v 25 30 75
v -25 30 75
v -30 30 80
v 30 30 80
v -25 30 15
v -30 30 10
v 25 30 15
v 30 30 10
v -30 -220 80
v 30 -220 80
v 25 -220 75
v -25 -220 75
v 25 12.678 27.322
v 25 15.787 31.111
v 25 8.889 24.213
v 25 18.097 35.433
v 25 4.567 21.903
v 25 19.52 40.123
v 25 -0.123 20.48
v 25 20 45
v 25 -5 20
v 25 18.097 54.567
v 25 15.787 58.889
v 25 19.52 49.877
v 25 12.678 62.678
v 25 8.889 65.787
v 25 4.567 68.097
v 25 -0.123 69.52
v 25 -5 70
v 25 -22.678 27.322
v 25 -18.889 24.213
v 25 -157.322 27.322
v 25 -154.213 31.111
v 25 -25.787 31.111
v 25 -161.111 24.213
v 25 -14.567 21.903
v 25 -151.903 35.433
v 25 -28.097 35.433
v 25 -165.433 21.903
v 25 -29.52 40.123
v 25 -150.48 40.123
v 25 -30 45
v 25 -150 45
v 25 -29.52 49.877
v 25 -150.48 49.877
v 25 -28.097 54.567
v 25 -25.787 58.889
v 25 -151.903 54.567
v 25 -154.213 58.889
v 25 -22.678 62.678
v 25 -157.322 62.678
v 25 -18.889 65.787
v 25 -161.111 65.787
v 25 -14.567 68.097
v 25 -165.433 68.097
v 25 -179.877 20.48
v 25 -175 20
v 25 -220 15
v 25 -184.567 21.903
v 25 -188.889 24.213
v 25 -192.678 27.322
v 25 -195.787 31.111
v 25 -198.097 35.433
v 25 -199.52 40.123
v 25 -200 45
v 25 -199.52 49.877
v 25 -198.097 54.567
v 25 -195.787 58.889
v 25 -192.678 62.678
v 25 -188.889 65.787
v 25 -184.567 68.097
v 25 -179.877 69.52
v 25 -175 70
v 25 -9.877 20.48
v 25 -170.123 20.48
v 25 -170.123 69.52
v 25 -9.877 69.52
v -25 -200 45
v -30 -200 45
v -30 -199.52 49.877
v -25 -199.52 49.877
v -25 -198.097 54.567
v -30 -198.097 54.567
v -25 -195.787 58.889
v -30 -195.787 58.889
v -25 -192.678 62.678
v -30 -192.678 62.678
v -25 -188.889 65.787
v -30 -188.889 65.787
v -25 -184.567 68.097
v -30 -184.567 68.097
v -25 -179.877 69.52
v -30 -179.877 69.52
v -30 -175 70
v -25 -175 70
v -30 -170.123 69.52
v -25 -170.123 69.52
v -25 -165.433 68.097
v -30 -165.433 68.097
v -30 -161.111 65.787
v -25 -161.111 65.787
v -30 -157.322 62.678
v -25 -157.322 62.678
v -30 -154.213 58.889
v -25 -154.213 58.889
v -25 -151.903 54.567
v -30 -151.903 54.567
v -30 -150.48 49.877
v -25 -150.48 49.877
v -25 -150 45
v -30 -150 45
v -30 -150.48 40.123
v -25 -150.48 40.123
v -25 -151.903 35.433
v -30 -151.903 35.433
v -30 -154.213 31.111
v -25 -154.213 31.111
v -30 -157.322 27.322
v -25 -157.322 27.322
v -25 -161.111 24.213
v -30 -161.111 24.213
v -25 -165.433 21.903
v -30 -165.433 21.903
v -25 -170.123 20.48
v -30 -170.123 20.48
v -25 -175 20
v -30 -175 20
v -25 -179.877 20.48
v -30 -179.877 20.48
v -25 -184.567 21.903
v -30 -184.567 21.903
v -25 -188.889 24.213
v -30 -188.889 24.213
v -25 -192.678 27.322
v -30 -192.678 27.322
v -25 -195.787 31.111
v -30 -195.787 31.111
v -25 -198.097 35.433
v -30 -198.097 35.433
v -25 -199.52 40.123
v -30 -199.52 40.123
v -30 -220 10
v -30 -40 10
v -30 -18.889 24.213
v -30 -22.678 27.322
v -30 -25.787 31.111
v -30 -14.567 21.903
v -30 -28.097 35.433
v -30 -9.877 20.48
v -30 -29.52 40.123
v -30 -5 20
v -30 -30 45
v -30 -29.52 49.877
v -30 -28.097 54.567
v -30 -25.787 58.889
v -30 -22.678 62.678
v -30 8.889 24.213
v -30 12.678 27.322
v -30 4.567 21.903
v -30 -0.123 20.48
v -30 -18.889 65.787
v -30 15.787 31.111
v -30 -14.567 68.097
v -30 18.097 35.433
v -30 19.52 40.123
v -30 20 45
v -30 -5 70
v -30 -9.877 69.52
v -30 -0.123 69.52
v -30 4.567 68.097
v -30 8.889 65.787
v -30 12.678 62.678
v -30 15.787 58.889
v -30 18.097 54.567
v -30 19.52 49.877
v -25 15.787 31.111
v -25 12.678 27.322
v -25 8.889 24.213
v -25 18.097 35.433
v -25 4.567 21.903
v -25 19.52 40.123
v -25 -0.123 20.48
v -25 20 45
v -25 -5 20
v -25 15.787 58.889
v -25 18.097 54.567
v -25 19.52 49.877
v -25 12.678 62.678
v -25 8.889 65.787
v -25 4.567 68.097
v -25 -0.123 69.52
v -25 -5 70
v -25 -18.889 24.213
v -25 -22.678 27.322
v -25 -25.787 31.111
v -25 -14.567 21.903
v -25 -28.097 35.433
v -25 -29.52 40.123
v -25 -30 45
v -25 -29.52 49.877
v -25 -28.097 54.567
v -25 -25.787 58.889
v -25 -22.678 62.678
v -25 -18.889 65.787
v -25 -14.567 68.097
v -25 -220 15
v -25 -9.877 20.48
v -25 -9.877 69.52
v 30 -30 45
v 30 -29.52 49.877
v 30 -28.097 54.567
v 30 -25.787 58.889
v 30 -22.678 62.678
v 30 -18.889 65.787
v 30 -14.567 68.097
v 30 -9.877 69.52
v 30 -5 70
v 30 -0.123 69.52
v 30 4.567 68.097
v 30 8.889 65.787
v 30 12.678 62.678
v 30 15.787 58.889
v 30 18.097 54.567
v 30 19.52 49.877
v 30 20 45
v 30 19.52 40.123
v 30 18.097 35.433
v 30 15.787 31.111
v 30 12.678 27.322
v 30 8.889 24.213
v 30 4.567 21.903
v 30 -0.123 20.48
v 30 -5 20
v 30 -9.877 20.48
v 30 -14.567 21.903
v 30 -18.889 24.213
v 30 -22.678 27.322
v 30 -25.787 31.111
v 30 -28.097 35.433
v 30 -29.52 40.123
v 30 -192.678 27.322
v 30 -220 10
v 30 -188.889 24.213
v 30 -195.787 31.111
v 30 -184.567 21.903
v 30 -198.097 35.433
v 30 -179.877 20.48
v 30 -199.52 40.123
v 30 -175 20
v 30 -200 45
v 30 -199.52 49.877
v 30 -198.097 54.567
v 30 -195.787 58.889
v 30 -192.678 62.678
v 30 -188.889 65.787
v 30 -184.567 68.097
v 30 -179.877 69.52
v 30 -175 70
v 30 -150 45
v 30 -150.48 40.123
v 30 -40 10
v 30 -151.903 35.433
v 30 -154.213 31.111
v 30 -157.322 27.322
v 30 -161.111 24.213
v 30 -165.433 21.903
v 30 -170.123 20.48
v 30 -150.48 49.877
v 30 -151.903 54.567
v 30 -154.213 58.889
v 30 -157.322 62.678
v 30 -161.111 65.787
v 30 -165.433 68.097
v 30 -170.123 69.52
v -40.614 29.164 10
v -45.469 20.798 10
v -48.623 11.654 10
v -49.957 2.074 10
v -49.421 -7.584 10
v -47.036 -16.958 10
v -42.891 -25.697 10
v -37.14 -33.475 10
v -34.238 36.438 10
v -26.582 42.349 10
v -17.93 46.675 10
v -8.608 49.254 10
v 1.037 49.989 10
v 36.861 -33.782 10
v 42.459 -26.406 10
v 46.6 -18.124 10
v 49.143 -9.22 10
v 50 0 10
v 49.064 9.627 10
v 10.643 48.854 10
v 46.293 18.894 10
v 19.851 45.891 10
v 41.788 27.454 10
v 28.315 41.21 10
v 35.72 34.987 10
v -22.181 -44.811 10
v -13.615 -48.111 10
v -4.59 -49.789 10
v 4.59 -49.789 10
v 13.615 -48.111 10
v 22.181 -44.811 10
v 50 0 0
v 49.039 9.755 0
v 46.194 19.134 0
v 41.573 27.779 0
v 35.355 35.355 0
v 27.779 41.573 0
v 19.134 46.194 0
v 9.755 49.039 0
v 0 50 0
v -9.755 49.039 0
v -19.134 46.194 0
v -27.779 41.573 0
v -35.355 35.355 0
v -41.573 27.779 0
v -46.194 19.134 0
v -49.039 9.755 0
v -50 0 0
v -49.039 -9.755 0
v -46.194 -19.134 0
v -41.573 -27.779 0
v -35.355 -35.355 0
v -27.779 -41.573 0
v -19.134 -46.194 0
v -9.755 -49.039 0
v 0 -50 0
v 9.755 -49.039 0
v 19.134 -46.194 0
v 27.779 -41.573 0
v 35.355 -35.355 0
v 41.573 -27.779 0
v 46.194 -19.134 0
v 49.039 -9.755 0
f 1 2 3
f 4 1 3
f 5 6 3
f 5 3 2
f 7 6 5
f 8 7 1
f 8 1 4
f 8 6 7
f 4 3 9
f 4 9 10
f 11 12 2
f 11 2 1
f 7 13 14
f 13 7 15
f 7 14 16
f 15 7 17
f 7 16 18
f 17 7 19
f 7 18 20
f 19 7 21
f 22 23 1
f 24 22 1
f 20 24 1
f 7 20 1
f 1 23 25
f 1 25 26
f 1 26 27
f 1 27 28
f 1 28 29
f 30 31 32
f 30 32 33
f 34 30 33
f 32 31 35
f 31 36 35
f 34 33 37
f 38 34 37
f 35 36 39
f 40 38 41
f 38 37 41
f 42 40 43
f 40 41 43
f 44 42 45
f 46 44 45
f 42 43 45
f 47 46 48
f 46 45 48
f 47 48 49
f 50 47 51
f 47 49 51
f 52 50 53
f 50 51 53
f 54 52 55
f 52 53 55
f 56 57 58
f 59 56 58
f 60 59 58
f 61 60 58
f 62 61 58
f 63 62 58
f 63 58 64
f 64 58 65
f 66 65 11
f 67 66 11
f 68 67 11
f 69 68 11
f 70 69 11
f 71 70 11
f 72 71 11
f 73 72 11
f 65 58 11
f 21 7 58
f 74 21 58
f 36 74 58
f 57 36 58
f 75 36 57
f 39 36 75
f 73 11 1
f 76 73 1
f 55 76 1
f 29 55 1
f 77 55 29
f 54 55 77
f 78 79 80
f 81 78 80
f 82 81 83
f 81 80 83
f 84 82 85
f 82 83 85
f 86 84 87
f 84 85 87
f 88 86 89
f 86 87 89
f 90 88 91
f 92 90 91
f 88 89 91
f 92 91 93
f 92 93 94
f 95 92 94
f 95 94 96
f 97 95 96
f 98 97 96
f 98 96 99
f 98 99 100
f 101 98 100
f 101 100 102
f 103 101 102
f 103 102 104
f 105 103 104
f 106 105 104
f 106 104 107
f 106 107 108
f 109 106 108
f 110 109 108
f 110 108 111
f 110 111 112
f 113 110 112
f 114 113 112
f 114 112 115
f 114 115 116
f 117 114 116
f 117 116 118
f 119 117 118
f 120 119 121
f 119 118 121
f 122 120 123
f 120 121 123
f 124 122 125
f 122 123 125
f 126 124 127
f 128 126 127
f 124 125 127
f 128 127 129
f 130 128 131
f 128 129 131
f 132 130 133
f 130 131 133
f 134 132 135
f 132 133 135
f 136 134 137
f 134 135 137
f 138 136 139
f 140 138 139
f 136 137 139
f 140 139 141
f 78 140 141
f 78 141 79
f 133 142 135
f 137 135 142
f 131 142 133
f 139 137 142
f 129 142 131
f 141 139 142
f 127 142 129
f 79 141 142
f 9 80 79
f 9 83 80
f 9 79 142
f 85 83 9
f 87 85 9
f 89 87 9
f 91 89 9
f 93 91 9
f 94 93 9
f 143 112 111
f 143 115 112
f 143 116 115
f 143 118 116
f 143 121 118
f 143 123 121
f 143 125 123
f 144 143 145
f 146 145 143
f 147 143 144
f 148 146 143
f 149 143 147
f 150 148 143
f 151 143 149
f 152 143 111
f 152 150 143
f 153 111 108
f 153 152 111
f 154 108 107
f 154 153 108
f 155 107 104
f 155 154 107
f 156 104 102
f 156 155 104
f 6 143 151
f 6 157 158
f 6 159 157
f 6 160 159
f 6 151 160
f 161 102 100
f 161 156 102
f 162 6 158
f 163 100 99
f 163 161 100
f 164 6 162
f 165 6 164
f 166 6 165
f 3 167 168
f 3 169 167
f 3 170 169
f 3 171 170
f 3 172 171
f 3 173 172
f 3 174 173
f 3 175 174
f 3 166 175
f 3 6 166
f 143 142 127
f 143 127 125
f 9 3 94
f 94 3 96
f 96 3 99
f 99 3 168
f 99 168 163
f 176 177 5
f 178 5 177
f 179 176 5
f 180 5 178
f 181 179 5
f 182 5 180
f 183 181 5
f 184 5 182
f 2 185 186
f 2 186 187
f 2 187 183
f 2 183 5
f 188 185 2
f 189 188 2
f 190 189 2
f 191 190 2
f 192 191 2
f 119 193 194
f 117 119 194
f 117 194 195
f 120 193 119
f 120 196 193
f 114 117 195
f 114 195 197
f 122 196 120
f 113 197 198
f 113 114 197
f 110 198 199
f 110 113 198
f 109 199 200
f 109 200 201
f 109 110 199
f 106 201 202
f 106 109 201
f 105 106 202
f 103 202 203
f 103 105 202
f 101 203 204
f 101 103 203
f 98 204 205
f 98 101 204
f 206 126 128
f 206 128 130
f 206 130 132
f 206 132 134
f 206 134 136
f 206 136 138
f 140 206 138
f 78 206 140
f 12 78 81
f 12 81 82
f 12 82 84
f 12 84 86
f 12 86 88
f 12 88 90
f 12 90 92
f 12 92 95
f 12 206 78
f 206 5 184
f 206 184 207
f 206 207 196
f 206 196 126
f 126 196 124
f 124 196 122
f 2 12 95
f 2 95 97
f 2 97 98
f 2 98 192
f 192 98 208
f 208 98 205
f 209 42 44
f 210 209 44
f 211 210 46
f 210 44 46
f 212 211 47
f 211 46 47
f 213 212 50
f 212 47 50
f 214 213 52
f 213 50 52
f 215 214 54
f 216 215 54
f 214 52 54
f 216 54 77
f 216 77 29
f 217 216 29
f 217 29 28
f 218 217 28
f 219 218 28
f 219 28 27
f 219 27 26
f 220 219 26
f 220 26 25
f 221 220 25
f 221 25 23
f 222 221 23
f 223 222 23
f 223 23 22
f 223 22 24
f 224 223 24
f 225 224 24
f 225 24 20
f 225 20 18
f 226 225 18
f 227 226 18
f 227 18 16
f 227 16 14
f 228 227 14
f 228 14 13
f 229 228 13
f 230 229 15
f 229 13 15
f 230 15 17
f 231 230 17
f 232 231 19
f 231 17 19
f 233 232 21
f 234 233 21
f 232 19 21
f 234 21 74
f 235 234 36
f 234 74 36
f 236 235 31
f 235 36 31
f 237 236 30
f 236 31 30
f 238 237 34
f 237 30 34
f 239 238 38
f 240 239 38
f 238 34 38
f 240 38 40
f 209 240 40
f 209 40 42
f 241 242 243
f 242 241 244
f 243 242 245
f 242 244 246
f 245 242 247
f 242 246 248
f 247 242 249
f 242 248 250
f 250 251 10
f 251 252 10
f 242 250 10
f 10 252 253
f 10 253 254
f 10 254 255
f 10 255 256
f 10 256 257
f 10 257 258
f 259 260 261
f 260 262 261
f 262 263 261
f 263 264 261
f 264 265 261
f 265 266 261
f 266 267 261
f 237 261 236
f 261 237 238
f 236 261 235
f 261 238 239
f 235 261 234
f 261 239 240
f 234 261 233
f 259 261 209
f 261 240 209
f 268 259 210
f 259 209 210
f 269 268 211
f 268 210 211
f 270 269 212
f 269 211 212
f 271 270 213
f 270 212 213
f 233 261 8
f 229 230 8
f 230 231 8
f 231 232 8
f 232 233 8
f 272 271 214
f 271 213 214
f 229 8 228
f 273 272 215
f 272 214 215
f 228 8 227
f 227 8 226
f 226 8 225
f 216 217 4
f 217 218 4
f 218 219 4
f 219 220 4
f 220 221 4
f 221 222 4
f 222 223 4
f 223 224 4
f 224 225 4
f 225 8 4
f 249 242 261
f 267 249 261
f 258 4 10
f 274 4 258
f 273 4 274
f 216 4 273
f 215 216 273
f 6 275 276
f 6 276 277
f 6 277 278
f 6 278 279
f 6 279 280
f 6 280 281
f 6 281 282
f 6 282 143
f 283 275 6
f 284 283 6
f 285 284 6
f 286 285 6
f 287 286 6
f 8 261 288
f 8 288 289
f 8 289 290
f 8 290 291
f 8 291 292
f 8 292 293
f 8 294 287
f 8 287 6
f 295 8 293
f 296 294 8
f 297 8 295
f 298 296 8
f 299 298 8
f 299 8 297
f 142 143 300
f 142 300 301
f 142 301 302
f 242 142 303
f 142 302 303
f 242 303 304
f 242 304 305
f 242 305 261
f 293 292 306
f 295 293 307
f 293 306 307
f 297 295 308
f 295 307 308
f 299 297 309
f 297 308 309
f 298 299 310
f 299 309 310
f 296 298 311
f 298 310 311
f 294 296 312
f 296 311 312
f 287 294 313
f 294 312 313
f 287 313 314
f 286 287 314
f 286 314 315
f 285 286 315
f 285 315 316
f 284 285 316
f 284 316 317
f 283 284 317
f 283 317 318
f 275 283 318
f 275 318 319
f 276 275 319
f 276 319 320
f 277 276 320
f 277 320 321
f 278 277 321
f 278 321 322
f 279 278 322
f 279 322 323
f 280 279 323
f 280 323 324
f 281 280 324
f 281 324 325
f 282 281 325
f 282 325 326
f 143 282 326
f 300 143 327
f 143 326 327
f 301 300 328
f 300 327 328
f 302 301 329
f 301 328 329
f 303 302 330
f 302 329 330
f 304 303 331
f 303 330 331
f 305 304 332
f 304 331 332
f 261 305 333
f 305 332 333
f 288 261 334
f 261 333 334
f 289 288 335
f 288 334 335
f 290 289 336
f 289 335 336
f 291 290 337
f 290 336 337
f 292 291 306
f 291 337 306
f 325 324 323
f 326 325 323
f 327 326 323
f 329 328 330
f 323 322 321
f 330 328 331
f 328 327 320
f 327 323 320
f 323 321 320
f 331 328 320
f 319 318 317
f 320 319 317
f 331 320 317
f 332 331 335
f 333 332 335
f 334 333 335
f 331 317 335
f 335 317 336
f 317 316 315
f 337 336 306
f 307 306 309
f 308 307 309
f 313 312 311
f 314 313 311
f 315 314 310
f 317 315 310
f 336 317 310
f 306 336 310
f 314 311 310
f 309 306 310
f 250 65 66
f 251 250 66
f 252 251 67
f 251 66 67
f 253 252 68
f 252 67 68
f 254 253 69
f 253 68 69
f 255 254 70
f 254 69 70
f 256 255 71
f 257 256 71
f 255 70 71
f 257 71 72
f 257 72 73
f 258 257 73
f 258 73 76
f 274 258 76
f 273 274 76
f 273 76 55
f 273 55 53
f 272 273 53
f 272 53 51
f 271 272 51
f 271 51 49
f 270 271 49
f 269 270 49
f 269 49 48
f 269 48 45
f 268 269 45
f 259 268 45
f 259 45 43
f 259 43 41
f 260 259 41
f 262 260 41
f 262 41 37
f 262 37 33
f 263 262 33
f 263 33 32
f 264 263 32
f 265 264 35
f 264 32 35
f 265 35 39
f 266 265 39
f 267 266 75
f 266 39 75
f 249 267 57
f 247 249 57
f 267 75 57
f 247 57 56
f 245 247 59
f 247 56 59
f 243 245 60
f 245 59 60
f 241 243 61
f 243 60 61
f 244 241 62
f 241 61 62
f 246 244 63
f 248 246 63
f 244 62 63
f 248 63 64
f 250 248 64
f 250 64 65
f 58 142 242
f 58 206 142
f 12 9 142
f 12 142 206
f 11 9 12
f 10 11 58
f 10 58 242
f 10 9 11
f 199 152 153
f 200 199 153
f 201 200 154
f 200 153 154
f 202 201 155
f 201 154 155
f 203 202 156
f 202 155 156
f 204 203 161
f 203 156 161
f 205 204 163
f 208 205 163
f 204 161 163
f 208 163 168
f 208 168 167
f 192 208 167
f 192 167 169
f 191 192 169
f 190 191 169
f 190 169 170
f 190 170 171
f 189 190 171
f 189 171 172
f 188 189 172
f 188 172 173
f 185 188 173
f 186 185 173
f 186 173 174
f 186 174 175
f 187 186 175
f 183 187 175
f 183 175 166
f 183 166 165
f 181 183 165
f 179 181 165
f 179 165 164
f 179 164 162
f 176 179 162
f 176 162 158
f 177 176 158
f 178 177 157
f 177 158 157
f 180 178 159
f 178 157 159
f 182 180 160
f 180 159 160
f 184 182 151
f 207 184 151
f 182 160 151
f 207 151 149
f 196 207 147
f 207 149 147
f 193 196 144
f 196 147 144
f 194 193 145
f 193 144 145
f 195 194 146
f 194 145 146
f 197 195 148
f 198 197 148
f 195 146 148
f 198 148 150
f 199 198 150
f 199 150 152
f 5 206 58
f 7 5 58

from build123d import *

# Parameters (mm, degrees)
SKETCH_1_R          = 50
EXTRUDE_1_DEPTH     = 10
SKETCH_3_W          = 60
SKETCH_3_H          = 60
EXTRUDE_2_DEPTH     = 70
SKETCH_4_W          = 60
SKETCH_4_H          = 70
EXTRUDE_3_DEPTH     = 190
SKETCH_5_R          = 25
CUT_EXTRUDE_4_DEPTH = 190
SKETCH_6_W          = 50
SKETCH_6_H          = 60
CUT_EXTRUDE_5_DEPTH = 287.006992922


with BuildPart() as part:
    # 草图1 → 凸台-拉伸1 (new body)
    with BuildSketch(Plane.XY):
        Circle(SKETCH_1_R)
    extrude(amount=EXTRUDE_1_DEPTH)

    # 草图3 → 凸台-拉伸2 (add)
    with BuildSketch(Plane.XY.offset(10)):
        Rectangle(SKETCH_3_W, SKETCH_3_H)
    extrude(amount=EXTRUDE_2_DEPTH)

    # 草图4 → 凸台-拉伸3 (add)
    with BuildSketch(Plane.XZ.offset(30)):
        with Locations((0, 45)):
            Rectangle(SKETCH_4_W, SKETCH_4_H)
    extrude(amount=EXTRUDE_3_DEPTH)

    # 草图5 → 切除-拉伸4 (cut)
    with BuildSketch(Plane.ZY.offset(30)):
        with Locations(Location((45, -5, 0), (0, 0, 270))):
            Circle(SKETCH_5_R)
        with Locations(Location((45, -175, 0), (0, 0, 270))):
            Circle(SKETCH_5_R)
    extrude(amount=-CUT_EXTRUDE_4_DEPTH, mode=Mode.SUBTRACT)

    # 草图6 → 切除-拉伸5 (cut, through all)
    with BuildSketch(Plane.XZ.offset(220)):
        with Locations((0, 45)):
            Rectangle(SKETCH_6_W, SKETCH_6_H)
    extrude(amount=-CUT_EXTRUDE_5_DEPTH, mode=Mode.SUBTRACT)


solid = part.part
